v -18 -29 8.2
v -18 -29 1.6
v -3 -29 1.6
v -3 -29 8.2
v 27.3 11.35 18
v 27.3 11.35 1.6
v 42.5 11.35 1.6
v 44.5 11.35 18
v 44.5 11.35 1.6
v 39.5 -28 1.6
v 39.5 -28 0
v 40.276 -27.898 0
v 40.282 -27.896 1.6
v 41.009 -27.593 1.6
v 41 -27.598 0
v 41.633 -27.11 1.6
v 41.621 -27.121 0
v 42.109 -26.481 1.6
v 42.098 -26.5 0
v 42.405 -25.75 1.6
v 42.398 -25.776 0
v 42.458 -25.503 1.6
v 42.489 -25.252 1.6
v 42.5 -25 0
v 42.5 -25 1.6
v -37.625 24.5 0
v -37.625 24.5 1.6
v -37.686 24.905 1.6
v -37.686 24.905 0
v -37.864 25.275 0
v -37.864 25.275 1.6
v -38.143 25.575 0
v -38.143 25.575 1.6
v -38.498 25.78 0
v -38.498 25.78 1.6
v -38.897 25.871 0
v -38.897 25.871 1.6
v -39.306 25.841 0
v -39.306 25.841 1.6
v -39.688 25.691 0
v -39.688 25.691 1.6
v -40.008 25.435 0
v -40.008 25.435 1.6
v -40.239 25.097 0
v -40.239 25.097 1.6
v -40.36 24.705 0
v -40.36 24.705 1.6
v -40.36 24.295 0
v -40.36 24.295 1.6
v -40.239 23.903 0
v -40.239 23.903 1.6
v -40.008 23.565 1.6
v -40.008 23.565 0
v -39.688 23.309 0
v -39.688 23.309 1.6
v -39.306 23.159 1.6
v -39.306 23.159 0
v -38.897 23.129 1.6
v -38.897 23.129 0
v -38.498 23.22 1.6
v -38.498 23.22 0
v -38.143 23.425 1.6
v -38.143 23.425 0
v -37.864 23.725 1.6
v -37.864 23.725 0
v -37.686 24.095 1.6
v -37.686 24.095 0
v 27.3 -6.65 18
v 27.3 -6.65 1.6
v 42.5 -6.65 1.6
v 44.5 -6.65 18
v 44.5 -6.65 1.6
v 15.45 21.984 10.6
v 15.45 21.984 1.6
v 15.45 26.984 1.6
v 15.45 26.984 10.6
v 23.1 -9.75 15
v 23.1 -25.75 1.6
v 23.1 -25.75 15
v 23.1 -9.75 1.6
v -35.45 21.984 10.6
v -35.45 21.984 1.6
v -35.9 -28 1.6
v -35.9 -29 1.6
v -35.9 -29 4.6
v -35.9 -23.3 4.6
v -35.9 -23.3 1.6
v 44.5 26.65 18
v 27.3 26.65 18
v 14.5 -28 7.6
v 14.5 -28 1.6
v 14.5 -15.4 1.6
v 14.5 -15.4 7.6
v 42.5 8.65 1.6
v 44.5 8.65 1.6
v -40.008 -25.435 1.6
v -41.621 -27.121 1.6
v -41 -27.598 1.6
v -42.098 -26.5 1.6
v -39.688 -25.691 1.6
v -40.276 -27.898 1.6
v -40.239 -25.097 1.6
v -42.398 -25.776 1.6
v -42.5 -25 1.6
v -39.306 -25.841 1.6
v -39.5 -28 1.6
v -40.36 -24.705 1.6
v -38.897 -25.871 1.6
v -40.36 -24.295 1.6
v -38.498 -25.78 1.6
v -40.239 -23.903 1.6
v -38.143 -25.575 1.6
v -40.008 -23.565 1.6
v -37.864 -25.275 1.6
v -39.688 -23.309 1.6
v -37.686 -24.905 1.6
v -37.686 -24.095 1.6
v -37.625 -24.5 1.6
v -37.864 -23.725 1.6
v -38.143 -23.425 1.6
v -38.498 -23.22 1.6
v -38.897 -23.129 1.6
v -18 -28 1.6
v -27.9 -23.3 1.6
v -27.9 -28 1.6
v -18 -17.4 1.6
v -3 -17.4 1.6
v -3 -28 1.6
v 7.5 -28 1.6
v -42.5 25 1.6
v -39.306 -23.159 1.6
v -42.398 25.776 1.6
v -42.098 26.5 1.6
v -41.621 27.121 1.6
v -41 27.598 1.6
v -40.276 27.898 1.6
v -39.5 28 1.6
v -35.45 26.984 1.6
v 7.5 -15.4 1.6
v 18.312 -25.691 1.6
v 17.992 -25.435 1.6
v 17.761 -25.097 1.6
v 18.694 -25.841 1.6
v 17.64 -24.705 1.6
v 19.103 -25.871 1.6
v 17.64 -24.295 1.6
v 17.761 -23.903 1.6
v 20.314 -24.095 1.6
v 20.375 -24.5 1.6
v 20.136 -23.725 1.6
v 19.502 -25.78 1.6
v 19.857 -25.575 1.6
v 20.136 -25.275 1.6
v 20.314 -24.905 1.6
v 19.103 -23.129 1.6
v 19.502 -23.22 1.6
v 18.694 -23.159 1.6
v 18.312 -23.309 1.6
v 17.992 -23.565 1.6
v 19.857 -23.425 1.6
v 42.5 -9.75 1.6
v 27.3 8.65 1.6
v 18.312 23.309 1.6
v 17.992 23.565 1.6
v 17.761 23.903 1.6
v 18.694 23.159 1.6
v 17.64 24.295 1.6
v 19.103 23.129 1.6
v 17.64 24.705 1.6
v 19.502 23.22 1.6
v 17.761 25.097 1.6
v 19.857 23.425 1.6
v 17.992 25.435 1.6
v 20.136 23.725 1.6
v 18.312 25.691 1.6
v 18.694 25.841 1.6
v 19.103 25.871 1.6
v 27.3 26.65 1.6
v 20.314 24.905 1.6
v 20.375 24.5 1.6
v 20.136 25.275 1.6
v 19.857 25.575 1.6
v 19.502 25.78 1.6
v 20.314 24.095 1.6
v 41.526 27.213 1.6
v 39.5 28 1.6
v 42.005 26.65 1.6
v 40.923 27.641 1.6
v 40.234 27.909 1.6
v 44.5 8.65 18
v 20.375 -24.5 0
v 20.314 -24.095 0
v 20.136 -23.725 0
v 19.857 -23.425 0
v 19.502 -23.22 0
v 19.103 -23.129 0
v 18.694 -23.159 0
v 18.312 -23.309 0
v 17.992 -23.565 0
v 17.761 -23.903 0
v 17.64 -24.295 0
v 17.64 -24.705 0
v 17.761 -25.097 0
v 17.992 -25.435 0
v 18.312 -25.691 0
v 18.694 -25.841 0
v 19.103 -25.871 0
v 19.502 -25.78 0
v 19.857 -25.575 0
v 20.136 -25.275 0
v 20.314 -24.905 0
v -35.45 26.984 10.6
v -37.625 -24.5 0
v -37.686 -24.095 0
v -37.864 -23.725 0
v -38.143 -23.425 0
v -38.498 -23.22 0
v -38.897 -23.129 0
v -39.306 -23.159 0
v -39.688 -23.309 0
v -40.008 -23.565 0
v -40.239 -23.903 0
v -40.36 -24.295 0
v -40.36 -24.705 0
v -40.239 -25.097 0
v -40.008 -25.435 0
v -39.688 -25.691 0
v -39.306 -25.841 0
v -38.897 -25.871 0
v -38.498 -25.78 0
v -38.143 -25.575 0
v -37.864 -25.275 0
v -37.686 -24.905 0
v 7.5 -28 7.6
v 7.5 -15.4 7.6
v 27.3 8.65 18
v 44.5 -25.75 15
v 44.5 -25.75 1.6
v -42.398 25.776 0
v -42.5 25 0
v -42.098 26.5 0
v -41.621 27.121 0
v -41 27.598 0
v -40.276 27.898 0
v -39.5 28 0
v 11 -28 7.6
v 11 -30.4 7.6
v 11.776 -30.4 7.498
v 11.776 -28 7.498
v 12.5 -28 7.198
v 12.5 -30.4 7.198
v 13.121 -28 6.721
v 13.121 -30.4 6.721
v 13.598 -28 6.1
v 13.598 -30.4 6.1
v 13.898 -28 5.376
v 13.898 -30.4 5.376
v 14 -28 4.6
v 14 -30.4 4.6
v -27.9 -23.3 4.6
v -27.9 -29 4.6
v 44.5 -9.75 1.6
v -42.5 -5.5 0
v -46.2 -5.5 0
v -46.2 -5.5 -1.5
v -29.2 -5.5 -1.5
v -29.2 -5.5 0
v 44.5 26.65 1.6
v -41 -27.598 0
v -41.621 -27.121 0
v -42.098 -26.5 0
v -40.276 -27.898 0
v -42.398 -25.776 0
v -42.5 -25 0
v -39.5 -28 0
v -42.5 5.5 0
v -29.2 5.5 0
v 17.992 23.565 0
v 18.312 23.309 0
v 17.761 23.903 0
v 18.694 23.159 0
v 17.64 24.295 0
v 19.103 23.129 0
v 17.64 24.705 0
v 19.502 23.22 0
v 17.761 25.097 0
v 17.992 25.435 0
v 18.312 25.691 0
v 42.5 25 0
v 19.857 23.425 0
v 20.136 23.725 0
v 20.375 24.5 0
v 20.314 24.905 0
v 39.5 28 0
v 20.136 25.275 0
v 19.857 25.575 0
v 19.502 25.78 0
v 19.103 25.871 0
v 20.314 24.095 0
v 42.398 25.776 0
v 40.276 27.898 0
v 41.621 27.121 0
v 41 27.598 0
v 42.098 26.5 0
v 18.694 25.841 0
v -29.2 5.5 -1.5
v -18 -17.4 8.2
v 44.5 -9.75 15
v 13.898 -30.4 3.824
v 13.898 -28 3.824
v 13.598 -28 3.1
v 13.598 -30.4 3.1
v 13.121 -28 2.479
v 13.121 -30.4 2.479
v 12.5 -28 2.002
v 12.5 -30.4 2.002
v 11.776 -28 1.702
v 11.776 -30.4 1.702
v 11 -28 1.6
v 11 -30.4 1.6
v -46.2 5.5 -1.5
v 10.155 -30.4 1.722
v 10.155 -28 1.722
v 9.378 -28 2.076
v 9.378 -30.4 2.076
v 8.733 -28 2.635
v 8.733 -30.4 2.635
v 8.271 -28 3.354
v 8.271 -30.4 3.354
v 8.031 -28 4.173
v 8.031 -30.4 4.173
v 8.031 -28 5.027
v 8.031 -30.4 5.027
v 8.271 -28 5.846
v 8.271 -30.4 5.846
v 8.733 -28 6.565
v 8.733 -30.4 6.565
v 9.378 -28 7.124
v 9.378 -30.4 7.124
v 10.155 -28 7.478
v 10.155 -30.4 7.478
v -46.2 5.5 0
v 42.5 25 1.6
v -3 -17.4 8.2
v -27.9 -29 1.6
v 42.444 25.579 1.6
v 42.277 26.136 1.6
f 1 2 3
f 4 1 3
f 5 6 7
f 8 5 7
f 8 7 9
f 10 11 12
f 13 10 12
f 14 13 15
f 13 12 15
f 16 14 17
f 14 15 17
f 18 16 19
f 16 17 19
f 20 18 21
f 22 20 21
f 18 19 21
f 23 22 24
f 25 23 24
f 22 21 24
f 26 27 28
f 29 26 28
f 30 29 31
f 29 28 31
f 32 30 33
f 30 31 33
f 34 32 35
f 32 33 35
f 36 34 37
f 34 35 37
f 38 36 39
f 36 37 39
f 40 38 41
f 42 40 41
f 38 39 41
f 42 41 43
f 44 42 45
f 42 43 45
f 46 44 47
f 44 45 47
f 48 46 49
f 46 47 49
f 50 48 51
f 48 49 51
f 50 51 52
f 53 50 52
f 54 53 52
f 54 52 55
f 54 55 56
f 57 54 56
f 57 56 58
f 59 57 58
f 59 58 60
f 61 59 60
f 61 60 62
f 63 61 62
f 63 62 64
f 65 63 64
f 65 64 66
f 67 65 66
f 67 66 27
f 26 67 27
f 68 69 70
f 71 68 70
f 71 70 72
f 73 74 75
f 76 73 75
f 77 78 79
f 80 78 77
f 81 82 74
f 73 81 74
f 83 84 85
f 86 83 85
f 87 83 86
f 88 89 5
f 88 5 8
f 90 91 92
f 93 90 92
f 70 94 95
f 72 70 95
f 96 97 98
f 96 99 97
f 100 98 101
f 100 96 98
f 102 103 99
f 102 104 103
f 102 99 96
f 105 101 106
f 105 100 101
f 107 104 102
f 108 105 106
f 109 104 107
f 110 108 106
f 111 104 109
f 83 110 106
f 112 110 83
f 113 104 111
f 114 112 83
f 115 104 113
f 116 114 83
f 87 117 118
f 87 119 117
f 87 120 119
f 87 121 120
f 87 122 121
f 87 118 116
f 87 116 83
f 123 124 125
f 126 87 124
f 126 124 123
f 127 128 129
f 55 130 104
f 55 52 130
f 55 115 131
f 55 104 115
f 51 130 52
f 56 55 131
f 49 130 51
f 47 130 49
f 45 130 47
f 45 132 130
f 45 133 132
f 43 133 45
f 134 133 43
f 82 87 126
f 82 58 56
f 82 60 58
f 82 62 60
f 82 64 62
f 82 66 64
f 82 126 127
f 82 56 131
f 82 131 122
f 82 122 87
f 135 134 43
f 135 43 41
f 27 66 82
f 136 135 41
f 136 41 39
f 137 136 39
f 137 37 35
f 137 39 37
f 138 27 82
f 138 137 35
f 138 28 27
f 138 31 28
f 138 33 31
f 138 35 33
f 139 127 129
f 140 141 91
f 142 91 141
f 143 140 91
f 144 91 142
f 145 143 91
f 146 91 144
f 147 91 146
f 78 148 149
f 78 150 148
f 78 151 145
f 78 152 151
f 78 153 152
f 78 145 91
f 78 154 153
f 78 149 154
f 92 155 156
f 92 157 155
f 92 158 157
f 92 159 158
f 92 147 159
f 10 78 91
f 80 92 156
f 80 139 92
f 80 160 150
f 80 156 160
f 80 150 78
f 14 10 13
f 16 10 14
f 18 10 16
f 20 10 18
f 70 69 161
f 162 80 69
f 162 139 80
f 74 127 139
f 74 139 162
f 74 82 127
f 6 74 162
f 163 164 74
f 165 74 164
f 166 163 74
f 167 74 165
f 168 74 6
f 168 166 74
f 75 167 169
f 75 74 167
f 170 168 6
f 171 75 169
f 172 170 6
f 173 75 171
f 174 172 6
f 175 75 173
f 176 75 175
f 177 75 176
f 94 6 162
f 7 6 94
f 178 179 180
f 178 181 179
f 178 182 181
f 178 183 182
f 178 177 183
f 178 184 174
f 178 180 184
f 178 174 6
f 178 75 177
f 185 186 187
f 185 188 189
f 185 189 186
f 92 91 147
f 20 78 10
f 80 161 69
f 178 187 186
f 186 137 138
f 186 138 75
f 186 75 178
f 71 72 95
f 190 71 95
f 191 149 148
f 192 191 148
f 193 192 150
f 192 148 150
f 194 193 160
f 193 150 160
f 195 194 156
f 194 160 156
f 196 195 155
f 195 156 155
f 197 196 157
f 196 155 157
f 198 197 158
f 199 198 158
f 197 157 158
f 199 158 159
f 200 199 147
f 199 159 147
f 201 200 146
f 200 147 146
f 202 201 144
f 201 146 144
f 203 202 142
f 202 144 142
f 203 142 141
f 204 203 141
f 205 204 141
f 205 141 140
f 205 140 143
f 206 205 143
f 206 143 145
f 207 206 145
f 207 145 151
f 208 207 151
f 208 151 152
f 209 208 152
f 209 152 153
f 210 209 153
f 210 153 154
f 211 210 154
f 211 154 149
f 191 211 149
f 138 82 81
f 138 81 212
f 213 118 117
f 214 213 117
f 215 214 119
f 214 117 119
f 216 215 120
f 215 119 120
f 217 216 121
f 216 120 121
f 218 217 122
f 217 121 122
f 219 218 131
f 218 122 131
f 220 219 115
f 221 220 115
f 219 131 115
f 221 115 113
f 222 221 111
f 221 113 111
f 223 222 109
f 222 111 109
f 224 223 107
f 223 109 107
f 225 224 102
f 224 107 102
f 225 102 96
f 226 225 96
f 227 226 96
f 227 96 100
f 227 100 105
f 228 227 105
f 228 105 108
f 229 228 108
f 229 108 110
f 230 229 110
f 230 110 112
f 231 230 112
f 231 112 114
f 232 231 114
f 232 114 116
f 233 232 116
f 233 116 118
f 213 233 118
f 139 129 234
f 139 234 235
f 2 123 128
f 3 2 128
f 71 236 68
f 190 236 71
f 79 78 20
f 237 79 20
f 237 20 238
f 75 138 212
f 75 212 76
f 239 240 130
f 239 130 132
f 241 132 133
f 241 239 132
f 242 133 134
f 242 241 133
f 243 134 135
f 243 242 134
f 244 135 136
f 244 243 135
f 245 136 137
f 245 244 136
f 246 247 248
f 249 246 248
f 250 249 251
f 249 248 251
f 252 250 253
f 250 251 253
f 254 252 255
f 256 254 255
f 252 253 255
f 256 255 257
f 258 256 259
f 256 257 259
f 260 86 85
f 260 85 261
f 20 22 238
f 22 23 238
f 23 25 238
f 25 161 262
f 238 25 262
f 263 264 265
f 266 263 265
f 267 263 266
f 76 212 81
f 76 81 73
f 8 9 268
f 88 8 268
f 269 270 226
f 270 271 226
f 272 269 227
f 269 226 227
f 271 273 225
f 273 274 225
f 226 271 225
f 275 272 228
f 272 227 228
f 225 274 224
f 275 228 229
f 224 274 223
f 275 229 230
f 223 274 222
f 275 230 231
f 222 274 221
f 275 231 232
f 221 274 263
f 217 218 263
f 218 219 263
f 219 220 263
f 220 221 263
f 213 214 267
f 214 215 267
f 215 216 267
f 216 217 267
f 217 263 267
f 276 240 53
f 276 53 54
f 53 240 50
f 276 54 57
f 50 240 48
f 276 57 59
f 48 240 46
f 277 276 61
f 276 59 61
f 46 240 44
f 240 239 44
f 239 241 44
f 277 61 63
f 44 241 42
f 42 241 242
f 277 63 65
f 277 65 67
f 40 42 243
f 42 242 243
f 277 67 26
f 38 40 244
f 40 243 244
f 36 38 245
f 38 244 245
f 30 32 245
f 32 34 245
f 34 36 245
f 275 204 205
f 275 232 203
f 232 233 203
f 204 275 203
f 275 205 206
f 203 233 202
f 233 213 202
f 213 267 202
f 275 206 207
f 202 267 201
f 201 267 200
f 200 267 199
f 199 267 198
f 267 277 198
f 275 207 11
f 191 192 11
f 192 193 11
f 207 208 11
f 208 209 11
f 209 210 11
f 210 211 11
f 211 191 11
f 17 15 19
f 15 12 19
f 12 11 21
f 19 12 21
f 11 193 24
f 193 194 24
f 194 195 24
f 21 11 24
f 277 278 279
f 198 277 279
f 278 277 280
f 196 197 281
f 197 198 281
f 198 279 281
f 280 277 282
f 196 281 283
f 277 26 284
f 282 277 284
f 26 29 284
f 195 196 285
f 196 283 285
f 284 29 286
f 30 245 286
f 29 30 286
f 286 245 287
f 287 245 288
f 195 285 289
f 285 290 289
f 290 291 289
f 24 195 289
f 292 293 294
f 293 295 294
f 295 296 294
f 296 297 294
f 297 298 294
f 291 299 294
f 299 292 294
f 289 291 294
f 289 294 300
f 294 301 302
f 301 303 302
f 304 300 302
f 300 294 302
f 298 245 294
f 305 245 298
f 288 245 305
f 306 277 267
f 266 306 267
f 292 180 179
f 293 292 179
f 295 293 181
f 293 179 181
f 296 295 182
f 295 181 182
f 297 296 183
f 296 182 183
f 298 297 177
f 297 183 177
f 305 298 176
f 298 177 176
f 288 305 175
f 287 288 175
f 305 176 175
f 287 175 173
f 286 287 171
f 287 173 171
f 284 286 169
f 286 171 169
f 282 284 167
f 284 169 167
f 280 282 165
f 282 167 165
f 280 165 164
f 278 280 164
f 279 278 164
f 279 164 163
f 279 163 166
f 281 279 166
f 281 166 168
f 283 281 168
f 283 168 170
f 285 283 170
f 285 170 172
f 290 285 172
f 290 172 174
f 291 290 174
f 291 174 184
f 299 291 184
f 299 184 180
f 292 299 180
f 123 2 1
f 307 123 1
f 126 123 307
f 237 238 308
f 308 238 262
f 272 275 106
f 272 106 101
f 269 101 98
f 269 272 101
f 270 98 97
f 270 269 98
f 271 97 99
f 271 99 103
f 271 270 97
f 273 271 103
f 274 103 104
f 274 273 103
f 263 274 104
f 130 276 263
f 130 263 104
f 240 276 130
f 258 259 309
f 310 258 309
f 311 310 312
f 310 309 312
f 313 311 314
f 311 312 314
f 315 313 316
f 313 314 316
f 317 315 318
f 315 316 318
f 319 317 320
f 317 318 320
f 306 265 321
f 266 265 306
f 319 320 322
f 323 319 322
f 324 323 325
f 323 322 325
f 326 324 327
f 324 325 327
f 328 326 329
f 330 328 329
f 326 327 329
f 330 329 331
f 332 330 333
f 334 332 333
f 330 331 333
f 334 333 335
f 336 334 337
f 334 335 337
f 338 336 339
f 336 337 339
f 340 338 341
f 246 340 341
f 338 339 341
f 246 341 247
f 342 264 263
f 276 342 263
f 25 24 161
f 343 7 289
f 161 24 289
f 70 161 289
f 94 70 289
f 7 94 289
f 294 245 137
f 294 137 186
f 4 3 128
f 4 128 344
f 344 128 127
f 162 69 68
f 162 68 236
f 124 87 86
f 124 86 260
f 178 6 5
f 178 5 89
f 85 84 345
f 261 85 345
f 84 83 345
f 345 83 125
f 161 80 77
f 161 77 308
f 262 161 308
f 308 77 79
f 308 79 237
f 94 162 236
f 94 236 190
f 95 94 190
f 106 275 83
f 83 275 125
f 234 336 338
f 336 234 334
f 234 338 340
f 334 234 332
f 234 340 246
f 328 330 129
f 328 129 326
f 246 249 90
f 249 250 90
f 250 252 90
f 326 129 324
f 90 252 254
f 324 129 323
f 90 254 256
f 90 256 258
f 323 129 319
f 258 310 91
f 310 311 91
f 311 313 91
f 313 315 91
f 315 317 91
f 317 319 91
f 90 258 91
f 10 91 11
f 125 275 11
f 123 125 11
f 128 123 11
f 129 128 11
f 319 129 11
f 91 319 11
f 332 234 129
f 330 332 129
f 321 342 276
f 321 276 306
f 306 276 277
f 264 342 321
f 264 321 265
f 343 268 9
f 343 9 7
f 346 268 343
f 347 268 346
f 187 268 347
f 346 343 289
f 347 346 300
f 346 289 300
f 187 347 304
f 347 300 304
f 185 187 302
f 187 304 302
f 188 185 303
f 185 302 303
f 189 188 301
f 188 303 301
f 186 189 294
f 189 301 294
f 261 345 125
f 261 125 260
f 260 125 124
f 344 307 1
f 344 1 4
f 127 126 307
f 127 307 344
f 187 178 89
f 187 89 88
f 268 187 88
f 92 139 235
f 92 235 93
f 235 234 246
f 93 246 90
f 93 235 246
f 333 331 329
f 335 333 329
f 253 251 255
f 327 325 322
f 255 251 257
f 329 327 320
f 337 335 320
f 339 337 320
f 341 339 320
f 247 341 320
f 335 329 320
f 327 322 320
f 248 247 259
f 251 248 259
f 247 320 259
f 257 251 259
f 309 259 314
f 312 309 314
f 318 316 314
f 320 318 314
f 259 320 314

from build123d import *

# Parameters (mm, degrees)
F0_W         = 85
F0_H         = 56
F1_DEPTH     = 1.6
F2_W         = 21.4
F2_H         = 16
F3_DEPTH     = 13.4
F4_W         = 17.2
F4_H         = 15.3
F5_DEPTH     = 16.4
F6_W         = 15
F6_H         = 11.6
F7_DEPTH     = 6.6
F8_W         = 7
F8_H         = 15
F9_DEPTH     = 6
F10_W        = 8
F10_H        = 5.7
F11_DEPTH    = 3
F12_W        = 17
F12_H        = 11
F13_DEPTH    = 1.5
F14_R        = 1.375
F15_DEPTH    = 3.101
F16_T1_DEPTH = 16.6
F16_T3_DEPTH = 9.1
F17_W        = 50.9
F17_H        = 5
F18_DEPTH    = 9
F20_DEPTH    = 2.4


# Not quite as in the source:
# - a fillet or chamfer that OpenCascade refuses, or shapes differently, is made with other operations: its cross-section is extruded or revolved along the edge and cut away or added


with BuildPart() as f1:
    # F0 (on Top) → F1 (new body)
    with BuildSketch(Plane.XY):
        Rectangle(F0_W, F0_H)
    extrude(amount=F1_DEPTH)

    # F2 (on face) → F3 (join)
    with BuildSketch(Plane.XY.offset(1.6)):
        with Locations((33.8, -17.75)):
            Rectangle(F2_W, F2_H)
    extrude(amount=F3_DEPTH)

    # F4 (on face) → F5 (join)
    with BuildSketch(Plane.XY.offset(1.6)):
        with Locations((35.9, 1)):
            Rectangle(F4_W, F4_H)
        with Locations((35.9, 19)):
            Rectangle(F4_W, F4_H)
    extrude(amount=F5_DEPTH)

    # F6 (on face) → F7 (join)
    with BuildSketch(Plane.XY.offset(1.6)):
        with Locations((-10.5, -23.2)):
            Rectangle(F6_W, F6_H)
    extrude(amount=F7_DEPTH)

    # F8 (on face) → F9 (join)
    with BuildSketch(Plane.XY.offset(1.6)):
        with Locations((11, -22.9)):
            Rectangle(F8_W, F8_H)
    extrude(amount=F9_DEPTH)

    # F10 (on face) → F11 (join)
    with BuildSketch(Plane.XY.offset(1.6)):
        with Locations((-31.9, -26.15)):
            Rectangle(F10_W, F10_H)
    extrude(amount=F11_DEPTH)

    # F12 (on face) → F13 (join)
    with BuildSketch(Plane(origin=(0, 0, 0), x_dir=(1, 0, 0), z_dir=(0, 0, -1))):
        with Locations((-37.7, 0)):
            Rectangle(F12_W, F12_H)
    extrude(amount=F13_DEPTH)

    # F14 (on face) → F15 (cut, through all)
    with BuildSketch(Plane.XY.offset(1.6)):
        with Locations((-39, -24.5)):
            Circle(F14_R)
        with Locations((19, -24.5)):
            Circle(F14_R)
        with Locations((-39, 24.5)):
            Circle(F14_R)
        with Locations((19, 24.5)):
            Circle(F14_R)
    extrude(amount=-F15_DEPTH, mode=Mode.SUBTRACT)

    # F16: fillet of radius 3 on 4 edges, made by hand

    # F16_s2 → F16_t1 (cut)
    with BuildSketch(Plane.XY.offset(-7.5)):
        with BuildLine():
            ThreePointArc((-39.5, -28), (-41.6213203436, -27.1213203436), (-42.5, -25))
            Line((-42.5, -25), (-42.5, -28))
            Line((-42.5, -28), (-39.5, -28))
        make_face()
        with BuildLine():
            ThreePointArc((-42.5, 25), (-41.6213203436, 27.1213203436), (-39.5, 28))
            Line((-39.5, 28), (-42.5, 28))
            Line((-42.5, 28), (-42.5, 25))
        make_face()
    extrude(amount=F16_T1_DEPTH, mode=Mode.SUBTRACT)

    # F16_s4 → F16_t3 (cut)
    with BuildSketch(Plane.XY.offset(-7.5)):
        with BuildLine():
            ThreePointArc((39.5, -28), (41.6213203436, -27.1213203436), (42.5, -25))
            Line((42.5, -25), (42.5, -28))
            Line((42.5, -28), (39.5, -28))
        make_face()
        with BuildLine():
            ThreePointArc((42.5, 25), (41.6213203436, 27.1213203436), (39.5, 28))
            Line((39.5, 28), (42.5, 28))
            Line((42.5, 28), (42.5, 25))
        make_face()
    extrude(amount=F16_T3_DEPTH, mode=Mode.SUBTRACT)

    # F17 (on face) → F18 (join)
    with BuildSketch(Plane.XY.offset(1.6)):
        with Locations((-10, 24.4839084893)):
            Rectangle(F17_W, F17_H)
    extrude(amount=F18_DEPTH)

    # F19 (on face) → F20 (cut)
    with BuildSketch(Plane.XZ.offset(30.4)):
        with BuildLine():
            ThreePointArc((11, 7.6), (13.1213203436, 6.7213203436), (14, 4.6))
            ThreePointArc((14, 4.6), (13.1213203436, 2.4786796564), (11, 1.6))
            Line((11, 1.6), (14.5, 1.6))
            Line((14.5, 1.6), (14.5, 7.6))
            Line((14.5, 7.6), (11, 7.6))
        make_face()
        with BuildLine():
            ThreePointArc((11, 1.6), (8, 4.6), (11, 7.6))
            Line((11, 7.6), (7.5, 7.6))
            Line((7.5, 7.6), (7.5, 1.6))
            Line((7.5, 1.6), (11, 1.6))
        make_face()
    extrude(amount=-F20_DEPTH, mode=Mode.SUBTRACT)


solid = f1.part
